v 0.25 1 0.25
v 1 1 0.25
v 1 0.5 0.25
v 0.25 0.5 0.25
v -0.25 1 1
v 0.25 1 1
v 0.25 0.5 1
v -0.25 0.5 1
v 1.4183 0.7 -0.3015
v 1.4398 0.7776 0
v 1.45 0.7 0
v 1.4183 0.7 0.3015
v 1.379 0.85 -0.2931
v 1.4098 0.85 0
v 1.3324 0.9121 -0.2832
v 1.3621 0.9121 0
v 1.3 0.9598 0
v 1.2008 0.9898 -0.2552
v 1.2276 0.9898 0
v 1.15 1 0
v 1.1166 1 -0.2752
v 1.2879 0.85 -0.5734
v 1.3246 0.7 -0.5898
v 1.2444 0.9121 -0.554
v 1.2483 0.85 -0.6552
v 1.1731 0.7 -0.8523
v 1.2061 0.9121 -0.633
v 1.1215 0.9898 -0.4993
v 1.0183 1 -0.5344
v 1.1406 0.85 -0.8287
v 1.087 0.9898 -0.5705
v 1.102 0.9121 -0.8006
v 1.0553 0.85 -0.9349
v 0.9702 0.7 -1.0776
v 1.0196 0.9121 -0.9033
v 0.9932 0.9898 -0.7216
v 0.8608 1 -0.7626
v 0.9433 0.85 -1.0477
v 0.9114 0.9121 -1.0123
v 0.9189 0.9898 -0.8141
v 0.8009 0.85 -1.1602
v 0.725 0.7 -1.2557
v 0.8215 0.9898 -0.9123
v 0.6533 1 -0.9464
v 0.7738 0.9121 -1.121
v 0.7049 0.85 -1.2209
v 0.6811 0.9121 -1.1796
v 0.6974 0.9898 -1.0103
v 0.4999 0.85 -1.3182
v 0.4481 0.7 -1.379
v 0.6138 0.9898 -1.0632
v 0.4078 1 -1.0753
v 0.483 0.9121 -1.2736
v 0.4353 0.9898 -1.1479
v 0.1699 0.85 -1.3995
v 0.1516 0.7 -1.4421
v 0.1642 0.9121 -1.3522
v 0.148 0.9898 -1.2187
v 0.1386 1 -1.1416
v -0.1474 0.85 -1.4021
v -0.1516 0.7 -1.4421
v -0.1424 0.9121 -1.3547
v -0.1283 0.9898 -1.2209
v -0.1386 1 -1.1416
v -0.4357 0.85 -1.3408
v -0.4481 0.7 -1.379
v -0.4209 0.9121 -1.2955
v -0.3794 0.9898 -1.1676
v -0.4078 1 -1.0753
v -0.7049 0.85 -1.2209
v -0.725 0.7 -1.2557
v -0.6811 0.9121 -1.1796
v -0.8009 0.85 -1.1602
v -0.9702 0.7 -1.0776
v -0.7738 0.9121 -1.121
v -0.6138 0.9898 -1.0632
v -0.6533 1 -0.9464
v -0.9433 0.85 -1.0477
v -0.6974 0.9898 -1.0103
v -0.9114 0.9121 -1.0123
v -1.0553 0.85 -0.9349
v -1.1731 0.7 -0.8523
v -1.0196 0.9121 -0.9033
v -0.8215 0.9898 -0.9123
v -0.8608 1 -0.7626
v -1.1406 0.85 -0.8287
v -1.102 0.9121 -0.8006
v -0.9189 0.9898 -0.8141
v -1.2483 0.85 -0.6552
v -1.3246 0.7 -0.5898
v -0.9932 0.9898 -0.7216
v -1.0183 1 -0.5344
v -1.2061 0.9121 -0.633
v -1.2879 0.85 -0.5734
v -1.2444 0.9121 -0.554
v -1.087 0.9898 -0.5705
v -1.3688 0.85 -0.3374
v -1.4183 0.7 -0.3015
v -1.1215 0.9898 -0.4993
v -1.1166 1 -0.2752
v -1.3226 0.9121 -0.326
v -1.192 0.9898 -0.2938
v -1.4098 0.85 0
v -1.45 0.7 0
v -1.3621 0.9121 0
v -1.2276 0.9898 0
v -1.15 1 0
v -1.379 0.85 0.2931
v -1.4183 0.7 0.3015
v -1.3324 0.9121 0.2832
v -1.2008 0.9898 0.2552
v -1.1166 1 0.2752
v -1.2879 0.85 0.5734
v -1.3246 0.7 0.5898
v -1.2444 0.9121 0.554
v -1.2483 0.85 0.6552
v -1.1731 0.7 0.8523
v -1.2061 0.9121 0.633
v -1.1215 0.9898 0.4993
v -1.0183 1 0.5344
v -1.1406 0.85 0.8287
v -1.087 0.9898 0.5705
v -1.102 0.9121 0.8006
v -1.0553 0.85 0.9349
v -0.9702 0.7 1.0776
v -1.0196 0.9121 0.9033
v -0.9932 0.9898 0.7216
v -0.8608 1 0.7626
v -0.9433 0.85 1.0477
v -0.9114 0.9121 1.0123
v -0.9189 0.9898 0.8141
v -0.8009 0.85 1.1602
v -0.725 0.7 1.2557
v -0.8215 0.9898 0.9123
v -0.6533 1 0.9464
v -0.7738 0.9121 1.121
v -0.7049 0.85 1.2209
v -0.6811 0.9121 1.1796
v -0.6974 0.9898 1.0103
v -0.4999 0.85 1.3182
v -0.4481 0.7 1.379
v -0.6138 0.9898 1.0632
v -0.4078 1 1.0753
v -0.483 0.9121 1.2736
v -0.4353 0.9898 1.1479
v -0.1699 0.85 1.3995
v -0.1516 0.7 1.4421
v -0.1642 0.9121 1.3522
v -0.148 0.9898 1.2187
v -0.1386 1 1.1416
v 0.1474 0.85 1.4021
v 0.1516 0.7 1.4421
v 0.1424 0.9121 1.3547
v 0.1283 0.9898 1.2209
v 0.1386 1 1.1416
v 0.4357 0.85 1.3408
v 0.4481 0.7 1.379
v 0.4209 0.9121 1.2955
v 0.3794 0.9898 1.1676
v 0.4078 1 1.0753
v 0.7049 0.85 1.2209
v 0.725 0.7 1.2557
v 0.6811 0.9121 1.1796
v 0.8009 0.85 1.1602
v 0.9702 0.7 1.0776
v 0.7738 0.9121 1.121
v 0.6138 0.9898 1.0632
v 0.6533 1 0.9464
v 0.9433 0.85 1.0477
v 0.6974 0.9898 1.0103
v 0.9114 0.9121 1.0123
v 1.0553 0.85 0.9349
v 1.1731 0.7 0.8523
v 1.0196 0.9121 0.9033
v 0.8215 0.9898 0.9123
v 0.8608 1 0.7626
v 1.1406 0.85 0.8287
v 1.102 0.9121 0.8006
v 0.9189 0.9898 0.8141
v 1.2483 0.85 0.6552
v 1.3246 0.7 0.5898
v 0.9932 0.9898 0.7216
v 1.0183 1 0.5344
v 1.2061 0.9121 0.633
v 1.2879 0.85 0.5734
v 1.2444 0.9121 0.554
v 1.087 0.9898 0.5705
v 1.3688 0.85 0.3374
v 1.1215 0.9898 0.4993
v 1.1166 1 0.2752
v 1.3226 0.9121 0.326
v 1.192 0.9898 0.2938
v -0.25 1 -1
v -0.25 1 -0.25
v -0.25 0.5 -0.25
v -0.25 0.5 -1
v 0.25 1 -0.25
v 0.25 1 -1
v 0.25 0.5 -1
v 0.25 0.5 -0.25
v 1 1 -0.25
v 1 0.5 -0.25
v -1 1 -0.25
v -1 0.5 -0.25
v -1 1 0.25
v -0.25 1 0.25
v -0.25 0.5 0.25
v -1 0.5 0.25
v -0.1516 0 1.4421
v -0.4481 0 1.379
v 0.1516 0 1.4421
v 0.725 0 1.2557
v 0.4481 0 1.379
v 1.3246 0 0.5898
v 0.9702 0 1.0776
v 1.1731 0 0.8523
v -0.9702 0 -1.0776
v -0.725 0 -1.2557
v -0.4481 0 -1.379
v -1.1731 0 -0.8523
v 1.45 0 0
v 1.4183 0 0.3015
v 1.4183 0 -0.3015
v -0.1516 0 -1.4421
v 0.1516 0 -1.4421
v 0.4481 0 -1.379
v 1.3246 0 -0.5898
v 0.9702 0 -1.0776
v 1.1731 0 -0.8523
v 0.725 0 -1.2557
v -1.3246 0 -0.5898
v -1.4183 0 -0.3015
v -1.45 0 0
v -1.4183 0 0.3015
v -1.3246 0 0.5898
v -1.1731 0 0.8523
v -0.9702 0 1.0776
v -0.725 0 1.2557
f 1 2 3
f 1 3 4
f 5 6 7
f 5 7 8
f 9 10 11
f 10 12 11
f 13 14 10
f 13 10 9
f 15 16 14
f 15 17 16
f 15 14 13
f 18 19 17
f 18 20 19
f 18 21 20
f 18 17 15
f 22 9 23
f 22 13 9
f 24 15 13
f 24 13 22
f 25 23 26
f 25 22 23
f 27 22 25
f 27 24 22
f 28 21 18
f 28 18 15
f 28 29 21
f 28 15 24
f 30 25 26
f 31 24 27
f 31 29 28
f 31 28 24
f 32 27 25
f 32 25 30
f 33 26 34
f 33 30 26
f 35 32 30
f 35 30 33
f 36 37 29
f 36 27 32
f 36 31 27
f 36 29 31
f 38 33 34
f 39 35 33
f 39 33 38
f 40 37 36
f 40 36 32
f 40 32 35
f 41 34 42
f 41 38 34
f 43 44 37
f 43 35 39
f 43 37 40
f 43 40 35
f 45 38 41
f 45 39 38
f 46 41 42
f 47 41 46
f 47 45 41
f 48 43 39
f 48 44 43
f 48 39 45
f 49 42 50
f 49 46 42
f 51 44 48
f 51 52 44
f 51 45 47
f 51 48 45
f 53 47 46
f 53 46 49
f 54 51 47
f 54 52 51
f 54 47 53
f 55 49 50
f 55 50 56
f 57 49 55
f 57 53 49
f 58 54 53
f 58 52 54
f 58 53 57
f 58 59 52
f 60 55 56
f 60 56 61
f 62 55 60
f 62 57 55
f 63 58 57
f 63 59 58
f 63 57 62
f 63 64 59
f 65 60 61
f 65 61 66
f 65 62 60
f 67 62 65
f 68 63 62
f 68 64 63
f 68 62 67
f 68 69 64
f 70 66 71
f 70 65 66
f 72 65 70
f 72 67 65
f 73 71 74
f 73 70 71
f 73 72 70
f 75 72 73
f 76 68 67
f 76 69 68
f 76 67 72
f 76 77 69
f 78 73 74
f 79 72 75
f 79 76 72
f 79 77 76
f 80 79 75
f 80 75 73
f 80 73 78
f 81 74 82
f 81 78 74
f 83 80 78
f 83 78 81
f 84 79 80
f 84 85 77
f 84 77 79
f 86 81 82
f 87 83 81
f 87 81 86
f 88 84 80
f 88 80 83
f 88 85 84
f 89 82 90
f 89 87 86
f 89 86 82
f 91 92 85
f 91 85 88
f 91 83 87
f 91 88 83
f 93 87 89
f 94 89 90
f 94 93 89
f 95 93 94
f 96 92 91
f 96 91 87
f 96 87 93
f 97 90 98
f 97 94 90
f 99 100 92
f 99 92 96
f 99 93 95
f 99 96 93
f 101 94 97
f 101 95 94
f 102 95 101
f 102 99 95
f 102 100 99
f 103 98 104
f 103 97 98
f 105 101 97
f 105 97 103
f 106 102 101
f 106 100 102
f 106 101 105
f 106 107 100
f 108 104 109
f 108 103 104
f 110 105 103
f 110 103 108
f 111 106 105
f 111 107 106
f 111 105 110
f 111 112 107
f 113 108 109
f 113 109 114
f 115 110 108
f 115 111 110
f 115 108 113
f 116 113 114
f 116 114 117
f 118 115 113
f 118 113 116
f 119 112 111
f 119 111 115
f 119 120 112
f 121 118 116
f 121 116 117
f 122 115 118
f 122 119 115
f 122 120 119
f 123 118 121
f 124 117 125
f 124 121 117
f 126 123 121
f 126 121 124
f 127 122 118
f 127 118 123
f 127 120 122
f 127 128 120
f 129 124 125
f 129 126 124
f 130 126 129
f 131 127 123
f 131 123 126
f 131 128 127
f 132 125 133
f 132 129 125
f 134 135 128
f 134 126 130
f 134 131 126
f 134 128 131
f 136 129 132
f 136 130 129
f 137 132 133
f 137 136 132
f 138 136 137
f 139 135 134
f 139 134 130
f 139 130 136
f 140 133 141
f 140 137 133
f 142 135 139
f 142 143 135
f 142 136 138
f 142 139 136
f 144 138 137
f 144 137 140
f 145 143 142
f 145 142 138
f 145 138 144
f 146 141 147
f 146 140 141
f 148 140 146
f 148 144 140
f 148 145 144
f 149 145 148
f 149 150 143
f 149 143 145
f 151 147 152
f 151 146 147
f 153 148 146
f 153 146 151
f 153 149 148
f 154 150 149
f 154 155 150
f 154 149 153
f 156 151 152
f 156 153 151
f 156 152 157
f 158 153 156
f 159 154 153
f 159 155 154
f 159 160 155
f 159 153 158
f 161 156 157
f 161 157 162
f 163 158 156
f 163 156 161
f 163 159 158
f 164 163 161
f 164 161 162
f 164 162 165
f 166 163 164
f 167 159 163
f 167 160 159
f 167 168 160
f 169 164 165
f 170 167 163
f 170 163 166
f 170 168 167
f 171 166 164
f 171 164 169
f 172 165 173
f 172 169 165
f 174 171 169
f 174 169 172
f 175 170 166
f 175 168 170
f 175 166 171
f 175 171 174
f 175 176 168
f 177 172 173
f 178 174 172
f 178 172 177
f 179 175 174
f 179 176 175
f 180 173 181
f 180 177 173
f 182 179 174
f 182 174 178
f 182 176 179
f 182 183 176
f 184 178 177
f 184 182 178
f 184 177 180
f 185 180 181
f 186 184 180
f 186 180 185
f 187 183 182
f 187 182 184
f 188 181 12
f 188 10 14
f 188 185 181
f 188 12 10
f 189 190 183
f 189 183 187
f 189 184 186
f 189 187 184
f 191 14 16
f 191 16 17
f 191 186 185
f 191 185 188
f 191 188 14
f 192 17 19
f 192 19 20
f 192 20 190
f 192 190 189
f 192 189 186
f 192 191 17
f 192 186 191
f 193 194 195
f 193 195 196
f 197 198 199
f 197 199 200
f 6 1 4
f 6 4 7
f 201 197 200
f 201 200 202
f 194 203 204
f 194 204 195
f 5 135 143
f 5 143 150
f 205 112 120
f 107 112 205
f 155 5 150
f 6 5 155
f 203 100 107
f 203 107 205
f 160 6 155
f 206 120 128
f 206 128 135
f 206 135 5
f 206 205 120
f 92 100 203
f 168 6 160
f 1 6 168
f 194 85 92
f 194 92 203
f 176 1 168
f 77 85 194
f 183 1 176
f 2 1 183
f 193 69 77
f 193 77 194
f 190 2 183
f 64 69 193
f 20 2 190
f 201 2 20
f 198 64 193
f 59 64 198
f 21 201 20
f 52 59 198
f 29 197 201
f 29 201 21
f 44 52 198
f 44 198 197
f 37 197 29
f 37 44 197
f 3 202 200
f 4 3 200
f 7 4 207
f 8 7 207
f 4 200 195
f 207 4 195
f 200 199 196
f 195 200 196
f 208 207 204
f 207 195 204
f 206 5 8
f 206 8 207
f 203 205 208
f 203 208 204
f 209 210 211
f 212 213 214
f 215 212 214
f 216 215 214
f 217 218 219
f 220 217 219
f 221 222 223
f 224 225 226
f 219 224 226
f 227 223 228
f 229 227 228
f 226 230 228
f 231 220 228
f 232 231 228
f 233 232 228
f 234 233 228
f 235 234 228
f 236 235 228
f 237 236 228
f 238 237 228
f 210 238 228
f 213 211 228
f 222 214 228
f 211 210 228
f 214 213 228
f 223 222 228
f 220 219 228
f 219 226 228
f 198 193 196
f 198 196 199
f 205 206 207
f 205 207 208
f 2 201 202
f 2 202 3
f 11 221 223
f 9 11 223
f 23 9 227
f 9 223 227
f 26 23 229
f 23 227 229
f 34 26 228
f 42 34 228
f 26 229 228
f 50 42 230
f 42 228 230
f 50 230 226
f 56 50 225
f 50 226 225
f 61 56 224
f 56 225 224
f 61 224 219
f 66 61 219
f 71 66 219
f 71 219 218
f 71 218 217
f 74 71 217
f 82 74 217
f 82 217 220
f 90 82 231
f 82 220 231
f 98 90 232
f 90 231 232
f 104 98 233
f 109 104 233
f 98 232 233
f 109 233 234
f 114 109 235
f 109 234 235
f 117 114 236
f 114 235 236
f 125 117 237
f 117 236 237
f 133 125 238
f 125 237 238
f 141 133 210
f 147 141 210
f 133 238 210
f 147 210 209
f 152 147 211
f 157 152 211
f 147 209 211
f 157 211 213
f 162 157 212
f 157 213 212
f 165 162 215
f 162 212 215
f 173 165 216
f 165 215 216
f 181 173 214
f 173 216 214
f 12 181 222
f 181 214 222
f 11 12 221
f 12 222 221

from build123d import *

# Parameters (mm, degrees)
SKETCH1_R           = 1.45
BOSS_EXTRUDE1_DEPTH = 1
CUT_EXTRUDE1_DEPTH  = 0.5
FILLET3_R           = 0.3


with BuildPart() as part:
    # Sketch1 → Boss-Extrude1 (new body)
    with BuildSketch(Plane(origin=(0, 0, 0), x_dir=(1, 0, 0), z_dir=(0, 1, 0))):
        Circle(SKETCH1_R)
    extrude(amount=BOSS_EXTRUDE1_DEPTH)

    # Sketch2 → Cut-Extrude1 (cut)
    with BuildSketch(Plane(origin=(0, 1, 0), x_dir=(1, 0, 0), z_dir=(0, 1, 0))):
        Polygon((-0.25, 0.25), (-0.25, 1), (0.25, 1), (0.25, 0.25), (1, 0.25), (1, -0.25), (0.25, -0.25), (0.25, -1), (-0.25, -1), (-0.25, -0.25), (-1, -0.25), (-1, 0.25), align=None)
    extrude(amount=-CUT_EXTRUDE1_DEPTH, mode=Mode.SUBTRACT)

    # Fillet3
    fillet3_edges = [part.edges().sort_by_distance(p)[0] for p in [
        (-1.45, 1, 0),
    ]]
    fillet(fillet3_edges, radius=FILLET3_R)


solid = part.part
